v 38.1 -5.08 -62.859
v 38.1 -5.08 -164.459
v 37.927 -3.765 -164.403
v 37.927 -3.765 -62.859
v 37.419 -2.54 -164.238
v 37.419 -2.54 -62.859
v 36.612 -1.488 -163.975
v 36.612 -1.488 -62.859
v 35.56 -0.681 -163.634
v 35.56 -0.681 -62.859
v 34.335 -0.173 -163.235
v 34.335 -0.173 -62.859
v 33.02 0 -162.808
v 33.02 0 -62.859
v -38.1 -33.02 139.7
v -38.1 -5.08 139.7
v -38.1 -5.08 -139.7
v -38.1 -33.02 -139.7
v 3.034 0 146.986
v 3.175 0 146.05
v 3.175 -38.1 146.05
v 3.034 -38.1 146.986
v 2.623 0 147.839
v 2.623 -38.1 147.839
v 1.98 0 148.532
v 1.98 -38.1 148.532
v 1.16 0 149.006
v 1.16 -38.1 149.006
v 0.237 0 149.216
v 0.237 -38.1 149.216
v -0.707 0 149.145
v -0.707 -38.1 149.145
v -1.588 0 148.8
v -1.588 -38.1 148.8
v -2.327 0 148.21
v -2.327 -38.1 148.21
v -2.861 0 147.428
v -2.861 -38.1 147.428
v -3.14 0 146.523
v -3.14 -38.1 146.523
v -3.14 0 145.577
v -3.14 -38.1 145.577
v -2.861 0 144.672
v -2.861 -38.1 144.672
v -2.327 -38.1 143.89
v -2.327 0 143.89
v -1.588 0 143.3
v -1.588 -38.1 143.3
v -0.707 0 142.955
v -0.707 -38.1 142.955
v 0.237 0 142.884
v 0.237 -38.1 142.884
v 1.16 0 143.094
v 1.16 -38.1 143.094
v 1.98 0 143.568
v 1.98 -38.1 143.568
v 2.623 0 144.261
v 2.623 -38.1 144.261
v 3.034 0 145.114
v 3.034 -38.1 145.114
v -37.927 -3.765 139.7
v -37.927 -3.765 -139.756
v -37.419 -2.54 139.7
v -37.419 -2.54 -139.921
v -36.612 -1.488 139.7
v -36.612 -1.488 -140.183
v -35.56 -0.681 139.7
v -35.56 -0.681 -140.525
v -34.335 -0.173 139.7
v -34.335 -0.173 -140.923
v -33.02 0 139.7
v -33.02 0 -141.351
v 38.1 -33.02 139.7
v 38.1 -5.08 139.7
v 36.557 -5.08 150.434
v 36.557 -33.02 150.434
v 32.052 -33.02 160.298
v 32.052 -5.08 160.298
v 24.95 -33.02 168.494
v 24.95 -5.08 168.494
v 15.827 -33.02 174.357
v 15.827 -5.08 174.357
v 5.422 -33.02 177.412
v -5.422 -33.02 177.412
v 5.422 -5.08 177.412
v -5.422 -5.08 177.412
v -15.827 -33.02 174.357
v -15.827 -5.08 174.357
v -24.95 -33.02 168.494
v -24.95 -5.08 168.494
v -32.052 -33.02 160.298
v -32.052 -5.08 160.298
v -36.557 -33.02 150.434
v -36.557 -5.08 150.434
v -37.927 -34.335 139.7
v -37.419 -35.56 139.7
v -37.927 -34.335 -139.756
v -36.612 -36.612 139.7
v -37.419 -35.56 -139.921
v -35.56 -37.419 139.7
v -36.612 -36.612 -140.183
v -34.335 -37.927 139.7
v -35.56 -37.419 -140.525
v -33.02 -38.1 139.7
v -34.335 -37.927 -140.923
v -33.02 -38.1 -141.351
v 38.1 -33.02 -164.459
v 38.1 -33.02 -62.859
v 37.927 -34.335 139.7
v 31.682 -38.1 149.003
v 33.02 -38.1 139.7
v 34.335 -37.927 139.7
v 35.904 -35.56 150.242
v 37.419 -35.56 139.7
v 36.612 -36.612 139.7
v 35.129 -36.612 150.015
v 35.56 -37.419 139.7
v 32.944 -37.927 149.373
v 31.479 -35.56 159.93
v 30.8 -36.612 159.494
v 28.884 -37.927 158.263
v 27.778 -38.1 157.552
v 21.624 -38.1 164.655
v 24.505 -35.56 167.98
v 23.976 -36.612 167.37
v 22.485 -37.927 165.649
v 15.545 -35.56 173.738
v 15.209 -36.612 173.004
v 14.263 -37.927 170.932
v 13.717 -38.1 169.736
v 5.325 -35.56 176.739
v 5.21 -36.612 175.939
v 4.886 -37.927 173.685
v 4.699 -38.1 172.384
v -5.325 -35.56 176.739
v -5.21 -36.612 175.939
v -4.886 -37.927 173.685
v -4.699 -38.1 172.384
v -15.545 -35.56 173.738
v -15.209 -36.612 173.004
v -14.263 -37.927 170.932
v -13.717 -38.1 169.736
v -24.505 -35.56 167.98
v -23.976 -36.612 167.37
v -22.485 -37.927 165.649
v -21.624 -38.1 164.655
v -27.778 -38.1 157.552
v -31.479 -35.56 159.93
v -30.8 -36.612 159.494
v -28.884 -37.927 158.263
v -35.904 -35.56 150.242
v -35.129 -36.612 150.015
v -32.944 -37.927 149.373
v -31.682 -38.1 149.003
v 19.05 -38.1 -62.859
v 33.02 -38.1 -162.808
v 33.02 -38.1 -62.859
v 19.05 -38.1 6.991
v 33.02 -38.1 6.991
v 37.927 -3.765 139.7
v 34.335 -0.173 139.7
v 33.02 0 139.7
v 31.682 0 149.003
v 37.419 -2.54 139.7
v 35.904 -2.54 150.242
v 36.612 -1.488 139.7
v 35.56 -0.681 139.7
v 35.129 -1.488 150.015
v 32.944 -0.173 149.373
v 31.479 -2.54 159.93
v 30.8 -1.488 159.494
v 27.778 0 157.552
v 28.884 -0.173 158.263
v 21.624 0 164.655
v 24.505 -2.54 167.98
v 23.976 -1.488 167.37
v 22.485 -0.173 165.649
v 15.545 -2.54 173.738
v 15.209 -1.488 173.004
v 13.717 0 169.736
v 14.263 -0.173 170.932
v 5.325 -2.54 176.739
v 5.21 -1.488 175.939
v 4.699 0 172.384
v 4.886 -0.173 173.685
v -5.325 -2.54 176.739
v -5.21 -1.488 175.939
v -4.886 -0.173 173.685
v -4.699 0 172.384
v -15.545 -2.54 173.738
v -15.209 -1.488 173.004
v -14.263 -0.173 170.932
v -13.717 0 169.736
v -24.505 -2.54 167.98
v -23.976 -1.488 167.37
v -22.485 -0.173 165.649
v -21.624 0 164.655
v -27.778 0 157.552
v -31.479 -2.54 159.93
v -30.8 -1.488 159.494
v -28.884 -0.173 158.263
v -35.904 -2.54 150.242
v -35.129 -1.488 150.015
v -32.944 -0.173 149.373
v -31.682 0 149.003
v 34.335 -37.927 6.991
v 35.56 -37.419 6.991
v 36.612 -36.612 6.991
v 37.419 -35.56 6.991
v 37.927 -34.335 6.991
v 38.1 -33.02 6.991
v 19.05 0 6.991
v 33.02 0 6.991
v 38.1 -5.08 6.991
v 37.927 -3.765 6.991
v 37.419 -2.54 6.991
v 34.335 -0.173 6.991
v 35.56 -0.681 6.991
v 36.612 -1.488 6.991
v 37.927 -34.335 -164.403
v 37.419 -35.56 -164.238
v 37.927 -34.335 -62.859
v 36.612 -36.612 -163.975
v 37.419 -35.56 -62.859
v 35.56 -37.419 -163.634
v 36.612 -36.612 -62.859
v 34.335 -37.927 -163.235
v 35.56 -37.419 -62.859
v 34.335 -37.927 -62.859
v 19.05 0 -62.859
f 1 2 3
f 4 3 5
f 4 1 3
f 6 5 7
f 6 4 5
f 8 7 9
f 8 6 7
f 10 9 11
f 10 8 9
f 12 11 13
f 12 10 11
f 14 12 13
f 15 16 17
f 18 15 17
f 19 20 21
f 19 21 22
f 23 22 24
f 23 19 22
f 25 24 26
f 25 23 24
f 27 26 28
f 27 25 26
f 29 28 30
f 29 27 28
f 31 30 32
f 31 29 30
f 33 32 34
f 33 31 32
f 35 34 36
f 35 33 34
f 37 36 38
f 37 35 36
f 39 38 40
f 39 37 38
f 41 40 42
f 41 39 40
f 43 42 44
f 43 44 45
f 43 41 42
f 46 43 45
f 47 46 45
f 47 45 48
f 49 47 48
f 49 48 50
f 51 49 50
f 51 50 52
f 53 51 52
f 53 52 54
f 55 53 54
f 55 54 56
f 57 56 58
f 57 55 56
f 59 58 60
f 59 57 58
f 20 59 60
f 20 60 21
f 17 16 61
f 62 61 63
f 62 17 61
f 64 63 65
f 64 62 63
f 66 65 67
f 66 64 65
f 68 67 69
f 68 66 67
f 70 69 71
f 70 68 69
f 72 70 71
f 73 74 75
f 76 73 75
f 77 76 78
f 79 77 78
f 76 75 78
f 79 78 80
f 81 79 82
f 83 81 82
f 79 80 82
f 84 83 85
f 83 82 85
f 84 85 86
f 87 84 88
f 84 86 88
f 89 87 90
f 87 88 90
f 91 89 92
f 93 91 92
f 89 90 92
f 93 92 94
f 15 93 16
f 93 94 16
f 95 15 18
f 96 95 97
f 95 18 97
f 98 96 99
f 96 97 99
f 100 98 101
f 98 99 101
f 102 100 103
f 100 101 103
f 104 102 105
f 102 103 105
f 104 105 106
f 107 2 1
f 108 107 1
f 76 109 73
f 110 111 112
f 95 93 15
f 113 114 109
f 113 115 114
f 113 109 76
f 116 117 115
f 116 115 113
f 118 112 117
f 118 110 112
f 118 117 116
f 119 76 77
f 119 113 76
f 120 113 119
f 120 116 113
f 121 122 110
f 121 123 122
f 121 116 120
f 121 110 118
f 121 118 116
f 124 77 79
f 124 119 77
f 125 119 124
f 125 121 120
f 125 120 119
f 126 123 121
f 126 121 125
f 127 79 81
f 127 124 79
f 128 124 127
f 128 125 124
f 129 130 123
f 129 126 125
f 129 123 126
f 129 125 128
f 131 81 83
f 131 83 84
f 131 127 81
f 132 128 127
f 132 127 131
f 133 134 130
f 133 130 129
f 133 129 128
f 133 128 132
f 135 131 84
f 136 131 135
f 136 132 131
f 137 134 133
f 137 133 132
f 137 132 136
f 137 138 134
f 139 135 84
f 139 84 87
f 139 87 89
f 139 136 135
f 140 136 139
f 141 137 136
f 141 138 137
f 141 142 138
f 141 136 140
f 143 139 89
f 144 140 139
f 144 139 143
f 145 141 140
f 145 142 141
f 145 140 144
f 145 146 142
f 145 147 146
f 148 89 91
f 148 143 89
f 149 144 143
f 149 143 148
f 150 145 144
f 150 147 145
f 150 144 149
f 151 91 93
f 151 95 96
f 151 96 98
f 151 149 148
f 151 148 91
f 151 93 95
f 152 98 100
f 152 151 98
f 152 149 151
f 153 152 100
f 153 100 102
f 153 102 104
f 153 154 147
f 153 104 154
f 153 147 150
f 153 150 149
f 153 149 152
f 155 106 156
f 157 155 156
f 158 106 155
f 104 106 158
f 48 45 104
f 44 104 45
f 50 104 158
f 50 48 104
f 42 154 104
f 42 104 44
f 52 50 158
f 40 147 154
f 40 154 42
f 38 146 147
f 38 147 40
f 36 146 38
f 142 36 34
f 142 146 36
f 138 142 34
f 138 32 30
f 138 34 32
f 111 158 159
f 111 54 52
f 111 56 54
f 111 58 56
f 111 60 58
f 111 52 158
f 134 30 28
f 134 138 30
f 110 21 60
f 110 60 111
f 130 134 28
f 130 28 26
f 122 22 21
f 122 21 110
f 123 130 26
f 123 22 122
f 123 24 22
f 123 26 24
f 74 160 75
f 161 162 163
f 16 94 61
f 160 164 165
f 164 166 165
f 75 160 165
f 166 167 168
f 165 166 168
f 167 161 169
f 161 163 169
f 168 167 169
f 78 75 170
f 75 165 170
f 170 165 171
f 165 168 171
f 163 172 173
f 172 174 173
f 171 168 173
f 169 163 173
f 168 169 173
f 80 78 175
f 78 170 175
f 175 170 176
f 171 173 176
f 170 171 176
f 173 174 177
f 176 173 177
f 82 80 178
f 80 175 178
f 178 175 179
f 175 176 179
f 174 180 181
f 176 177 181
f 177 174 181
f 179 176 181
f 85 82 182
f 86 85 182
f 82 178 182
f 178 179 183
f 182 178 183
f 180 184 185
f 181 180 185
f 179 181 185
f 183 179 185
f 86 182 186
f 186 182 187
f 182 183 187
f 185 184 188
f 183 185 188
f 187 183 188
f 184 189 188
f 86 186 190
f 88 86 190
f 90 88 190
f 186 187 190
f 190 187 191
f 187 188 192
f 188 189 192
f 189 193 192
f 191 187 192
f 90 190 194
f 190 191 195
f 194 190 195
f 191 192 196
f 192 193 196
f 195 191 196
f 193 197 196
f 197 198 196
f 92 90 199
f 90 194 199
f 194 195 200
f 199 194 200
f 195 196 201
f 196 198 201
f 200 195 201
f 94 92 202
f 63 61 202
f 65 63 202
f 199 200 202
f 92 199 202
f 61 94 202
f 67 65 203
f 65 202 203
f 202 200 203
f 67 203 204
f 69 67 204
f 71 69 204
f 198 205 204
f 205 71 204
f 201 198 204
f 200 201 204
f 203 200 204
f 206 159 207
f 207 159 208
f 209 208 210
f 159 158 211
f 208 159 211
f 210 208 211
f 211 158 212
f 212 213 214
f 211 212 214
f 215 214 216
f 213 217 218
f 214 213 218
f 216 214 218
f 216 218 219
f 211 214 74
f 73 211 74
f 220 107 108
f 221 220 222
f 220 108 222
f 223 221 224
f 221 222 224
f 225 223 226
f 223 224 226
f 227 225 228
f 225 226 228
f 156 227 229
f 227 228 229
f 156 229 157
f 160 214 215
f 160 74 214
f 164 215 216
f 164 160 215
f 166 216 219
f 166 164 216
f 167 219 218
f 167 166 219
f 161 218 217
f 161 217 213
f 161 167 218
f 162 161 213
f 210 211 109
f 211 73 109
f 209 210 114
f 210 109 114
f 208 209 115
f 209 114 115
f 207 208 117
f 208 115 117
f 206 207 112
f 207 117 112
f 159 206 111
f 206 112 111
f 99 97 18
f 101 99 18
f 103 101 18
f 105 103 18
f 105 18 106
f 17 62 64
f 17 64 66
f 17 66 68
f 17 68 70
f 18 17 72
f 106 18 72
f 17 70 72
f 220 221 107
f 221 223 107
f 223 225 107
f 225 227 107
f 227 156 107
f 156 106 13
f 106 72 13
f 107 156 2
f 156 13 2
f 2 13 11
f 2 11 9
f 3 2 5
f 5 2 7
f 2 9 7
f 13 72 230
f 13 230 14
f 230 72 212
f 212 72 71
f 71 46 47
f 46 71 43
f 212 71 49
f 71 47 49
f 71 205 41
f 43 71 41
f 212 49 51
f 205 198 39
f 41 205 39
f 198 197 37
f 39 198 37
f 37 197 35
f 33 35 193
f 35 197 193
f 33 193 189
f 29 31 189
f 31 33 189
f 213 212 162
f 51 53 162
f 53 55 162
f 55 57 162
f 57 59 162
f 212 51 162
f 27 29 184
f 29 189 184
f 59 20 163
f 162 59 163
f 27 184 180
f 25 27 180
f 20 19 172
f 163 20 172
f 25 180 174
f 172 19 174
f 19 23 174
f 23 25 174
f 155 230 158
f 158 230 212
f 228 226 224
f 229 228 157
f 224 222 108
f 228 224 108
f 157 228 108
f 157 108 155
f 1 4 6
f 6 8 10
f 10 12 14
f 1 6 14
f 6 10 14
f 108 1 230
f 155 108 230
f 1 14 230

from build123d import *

# Parameters (mm, degrees)
F0_R     = 3.175
F1_DEPTH = 38.1
F2_R     = 5.08
F3_DEPTH = 38.1


with BuildPart() as f1:
    # F0 (on Front) → F1 (new body)
    with BuildSketch(Plane.XZ):
        with BuildLine():
            ThreePointArc((38.1, 139.7), (0, 177.8), (-38.1, 139.7))
            Line((-38.1, 139.7), (-38.1, -139.7))
            Line((-38.1, -139.7), (38.1, -164.458881))
            Line((38.1, -164.458881), (38.1, -62.858881))
            Line((38.1, -62.858881), (19.05, -62.858881))
            Line((19.05, -62.858881), (19.05, 6.991119))
            Line((19.05, 6.991119), (38.1, 6.991119))
            Line((38.1, 6.991119), (38.1, 139.7))
        make_face()
        with Locations((0, 146.05)):
            Circle(F0_R, mode=Mode.SUBTRACT)
    extrude(amount=F1_DEPTH)

    # F2
    f2_edges = [f1.edges().sort_by_distance(p)[0] for p in [
        (-38.1, 0, 0),
        (38.1, 0, -113.658881),
        (38.1, 0, 73.34556),
        (0, 0, 177.8),
        (-38.1, -38.1, 0),
        (0, -38.1, 177.8),
        (38.1, -38.1, -113.658881),
        (38.1, -38.1, 73.34556),
    ]]
    fillet(f2_edges, radius=F2_R)

    # F0 (on Front) → F3 (cut)
    with BuildSketch(Plane.XZ):
        with Locations((0, 146.05)):
            Circle(F0_R)
    extrude(amount=-F3_DEPTH, mode=Mode.SUBTRACT)


solid = f1.part
